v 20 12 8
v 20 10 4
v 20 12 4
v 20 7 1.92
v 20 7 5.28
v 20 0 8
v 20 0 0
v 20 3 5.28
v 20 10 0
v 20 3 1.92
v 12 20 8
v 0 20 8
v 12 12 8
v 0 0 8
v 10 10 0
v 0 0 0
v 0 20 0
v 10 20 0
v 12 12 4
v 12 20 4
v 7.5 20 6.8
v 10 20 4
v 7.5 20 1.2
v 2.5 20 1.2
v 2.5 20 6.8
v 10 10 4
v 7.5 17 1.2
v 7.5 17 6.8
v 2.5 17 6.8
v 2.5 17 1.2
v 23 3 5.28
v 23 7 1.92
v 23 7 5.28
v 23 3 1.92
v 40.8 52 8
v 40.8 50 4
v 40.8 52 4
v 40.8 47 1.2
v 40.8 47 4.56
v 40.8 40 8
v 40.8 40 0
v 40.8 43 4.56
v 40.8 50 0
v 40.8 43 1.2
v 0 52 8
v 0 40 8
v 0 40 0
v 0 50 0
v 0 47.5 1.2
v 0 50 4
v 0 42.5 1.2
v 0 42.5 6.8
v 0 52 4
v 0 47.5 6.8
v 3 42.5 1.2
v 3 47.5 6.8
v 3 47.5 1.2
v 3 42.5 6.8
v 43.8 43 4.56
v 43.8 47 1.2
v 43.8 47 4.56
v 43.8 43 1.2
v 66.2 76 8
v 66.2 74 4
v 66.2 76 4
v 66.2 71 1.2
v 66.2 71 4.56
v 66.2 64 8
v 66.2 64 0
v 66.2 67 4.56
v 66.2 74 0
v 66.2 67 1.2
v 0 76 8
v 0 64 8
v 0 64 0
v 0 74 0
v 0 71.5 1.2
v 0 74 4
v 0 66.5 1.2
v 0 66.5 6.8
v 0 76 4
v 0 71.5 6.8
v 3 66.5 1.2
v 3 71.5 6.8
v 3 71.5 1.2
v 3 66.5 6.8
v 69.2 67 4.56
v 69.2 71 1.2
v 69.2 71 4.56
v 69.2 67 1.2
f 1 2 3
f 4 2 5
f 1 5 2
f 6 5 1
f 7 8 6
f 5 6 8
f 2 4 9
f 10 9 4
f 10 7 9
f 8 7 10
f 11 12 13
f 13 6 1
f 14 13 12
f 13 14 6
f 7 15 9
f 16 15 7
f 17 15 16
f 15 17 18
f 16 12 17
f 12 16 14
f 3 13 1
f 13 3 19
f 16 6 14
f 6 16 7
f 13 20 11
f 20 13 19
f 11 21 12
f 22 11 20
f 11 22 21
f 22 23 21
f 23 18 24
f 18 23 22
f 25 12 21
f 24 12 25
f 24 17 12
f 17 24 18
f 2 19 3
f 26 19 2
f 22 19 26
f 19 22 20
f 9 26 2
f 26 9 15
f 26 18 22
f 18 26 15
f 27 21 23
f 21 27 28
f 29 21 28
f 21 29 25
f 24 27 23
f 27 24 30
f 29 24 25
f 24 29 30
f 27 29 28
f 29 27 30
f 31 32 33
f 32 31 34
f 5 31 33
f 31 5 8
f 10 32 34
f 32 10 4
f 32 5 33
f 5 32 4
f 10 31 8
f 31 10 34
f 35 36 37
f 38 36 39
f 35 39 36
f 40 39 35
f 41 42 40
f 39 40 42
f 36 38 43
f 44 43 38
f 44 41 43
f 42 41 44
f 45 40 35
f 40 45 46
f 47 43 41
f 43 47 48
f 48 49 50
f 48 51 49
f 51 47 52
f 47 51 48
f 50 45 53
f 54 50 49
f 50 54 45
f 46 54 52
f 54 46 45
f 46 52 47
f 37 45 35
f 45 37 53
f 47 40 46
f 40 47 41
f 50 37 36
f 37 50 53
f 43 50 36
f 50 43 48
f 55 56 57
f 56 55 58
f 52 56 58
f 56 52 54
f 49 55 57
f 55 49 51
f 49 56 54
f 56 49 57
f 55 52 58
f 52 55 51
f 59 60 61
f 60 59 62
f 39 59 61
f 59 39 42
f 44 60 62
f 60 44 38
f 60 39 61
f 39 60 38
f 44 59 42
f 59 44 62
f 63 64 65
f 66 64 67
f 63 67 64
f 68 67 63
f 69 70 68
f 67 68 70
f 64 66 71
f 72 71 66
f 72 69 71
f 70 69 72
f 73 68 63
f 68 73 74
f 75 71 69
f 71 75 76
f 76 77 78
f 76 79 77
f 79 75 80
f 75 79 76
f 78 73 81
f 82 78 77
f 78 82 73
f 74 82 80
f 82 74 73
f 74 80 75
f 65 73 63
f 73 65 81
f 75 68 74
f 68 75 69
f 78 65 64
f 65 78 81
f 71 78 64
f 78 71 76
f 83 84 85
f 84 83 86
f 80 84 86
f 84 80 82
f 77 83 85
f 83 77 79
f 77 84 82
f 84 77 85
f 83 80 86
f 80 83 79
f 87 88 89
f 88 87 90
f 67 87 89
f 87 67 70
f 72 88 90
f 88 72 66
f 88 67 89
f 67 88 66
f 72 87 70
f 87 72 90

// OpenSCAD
// file: frame_segment.scad
module frame_segment(segment_length, front_width, shelf_width, thickness, connector_length) {
    connector_offset = (front_width - shelf_width) * 0.5;
    //connector_radius = (thickness / 2) * 0.75;
    connector_width = (front_width - shelf_width) * 0.5;
    connector_height = thickness * 0.7;
    male_connector_width = connector_width * 0.8;
    male_connector_height = connector_height * 0.6;
    
    union () {
        difference() {
            cube([segment_length, front_width, thickness]);
            
            translate([0, front_width - shelf_width, 0])
            cube([segment_length, shelf_width, thickness / 2]);
            
            translate([0, (front_width - shelf_width - connector_width) / 2, (thickness-connector_height)/ 2])
            cube([connector_length, connector_width, connector_height]);
            //cylinder(connector_length, connector_radius, connector_radius);
        }
        
        translate([segment_length, (front_width - shelf_width - male_connector_width) / 2, (thickness-connector_height)/ 2])
        cube([connector_length, male_connector_width, male_connector_height]);
        //cylinder(connector_length, connector_width, connector_height);
    }
}

//frame_segment(21, 8, 1, 8, 3);
/*
PART_LENGTH = 100;
OUTER_WIDTH = 20;
INNER_WIDTH = 10;
FRAME_THICKNESS = 8;
CONNECTOR_DEPTH = 3;
CONNECTOR_RADIUS = (OUTER_WIDTH - INNER_WIDTH) * 0.5 * 0.75;
CONNECTOR_OFFSET = (OUTER_WIDTH - INNER_WIDTH) * 0.5;

union () {
    difference() {
        cube([PART_LENGTH, OUTER_WIDTH, FRAME_THICKNESS]);
        
        translate([0, OUTER_WIDTH / 2, 0])
        cube([PART_LENGTH, INNER_WIDTH, FRAME_THICKNESS / 2]);
        
        translate([CONNECTOR_DEPTH, CONNECTOR_OFFSET, FRAME_THICKNESS / 2])
        rotate([0, -90, 0])
        cylinder(CONNECTOR_DEPTH, CONNECTOR_RADIUS, CONNECTOR_RADIUS);
    }
    
    translate([PART_LENGTH, CONNECTOR_OFFSET, FRAME_THICKNESS / 2])
    rotate([0, 90, 0])
    cylinder(CONNECTOR_DEPTH, CONNECTOR_RADIUS, CONNECTOR_RADIUS);
}
*/
// file: frame_corner.scad
function calc_inner_edge(outer_edge_length, front_width) = outer_edge_length - front_width;

module frame_corner(outer_edge_length, front_width, shelf_width, thickness, connector_length) {
    inner_edge_length = outer_edge_length - front_width;
    connector_offset = (front_width - shelf_width) * 0.5;
    //connector_radius = (thickness / 2) * 0.75;
    connector_width = (front_width - shelf_width) * 0.5;
    connector_height = thickness * 0.7;
    male_connector_width = connector_width * 0.8;
    male_connector_height = connector_height * 0.6;
    
    union () {
    // Carve shelf for picture corner, carve connector hole
        difference () {
            // Form corner
            union(){
                cube([outer_edge_length, front_width, thickness]);

                translate([front_width, 0, 0])
                    rotate([0, 0, 90])
                        cube([outer_edge_length, front_width, thickness]);
            };
            // First shelf part
            translate([outer_edge_length - inner_edge_length, front_width - shelf_width, 0])
            cube([inner_edge_length, shelf_width, thickness / 2]);
            
            // Second shelf part
            translate([front_width - shelf_width, outer_edge_length - inner_edge_length, 0])
            cube([shelf_width, inner_edge_length, thickness / 2]);       
     
            
            // Corner between shelves
            translate([front_width - shelf_width, front_width - shelf_width, 0])
            cube([shelf_width, shelf_width, thickness / 2]);
            
            // Connector recess
            translate([(front_width - shelf_width - connector_width) / 2, outer_edge_length - connector_length, (thickness-connector_height)/ 2])
            cube([connector_width, connector_length, connector_height]);
            //cylinder(connector_length, connector_radius, connector_radius);
        }
        
        // Connector peg
        translate([outer_edge_length,(front_width - shelf_width - male_connector_width) / 2, (thickness-connector_height) * 0.8])
        cube([connector_length, male_connector_width, male_connector_height]);
        //cylinder(connector_length, connector_radius*.8, connector_radius*.8);
    }
}

//frame_corner(40, 20, 10, 8, 3);

/*LEN_WID = 40; // Length of each outer edge
OUTER_WIDTH = 20; // Width of ends
INNER_WIDTH = 10; // Widtb of shelf ends
FRAME_THICKNESS = 8;
INNER_LEN_WID = LEN_WID - OUTER_WIDTH; // Length of each inside edge
CONNECTOR_DEPTH = 3;
CONNECTOR_RADIUS = (OUTER_WIDTH - INNER_WIDTH) * 0.5 * 0.75;
CONNECTOR_OFFSET = (OUTER_WIDTH - INNER_WIDTH) * 0.5;

// Add connector peg
union () {
    // Carve shelf for picture corner, carve connector hole
    difference () {
        // Form corner
        union(){
            cube([LEN_WID, OUTER_WIDTH, FRAME_THICKNESS]);

            translate([OUTER_WIDTH, 0, 0])
                rotate([0, 0, 90])
                    cube([LEN_WID, OUTER_WIDTH, FRAME_THICKNESS]);
        };
        // First shelf part
        translate([LEN_WID / 2, OUTER_WIDTH / 2, 0])
        cube([INNER_LEN_WID, INNER_WIDTH, FRAME_THICKNESS / 2]);
        
        // Second shelf part
        translate([OUTER_WIDTH, LEN_WID / 2, 0])
        rotate([0, 0, 90])
        cube([INNER_LEN_WID, INNER_WIDTH, FRAME_THICKNESS / 2]);
        
        // Corner between shelves
        translate([OUTER_WIDTH / 2, OUTER_WIDTH / 2, 0])
        cube([INNER_WIDTH, INNER_WIDTH, FRAME_THICKNESS / 2]);
        
        // Connector recess
        translate([CONNECTOR_OFFSET, LEN_WID - CONNECTOR_DEPTH, FRAME_THICKNESS / 2])
        rotate([-90, 0, 0])
        cylinder(CONNECTOR_DEPTH, CONNECTOR_RADIUS, CONNECTOR_RADIUS);
    }
    
    // Connector peg
    translate([LEN_WID + CONNECTOR_DEPTH, CONNECTOR_OFFSET, FRAME_THICKNESS / 2])
        rotate([0, -90, 0])
        cylinder(CONNECTOR_DEPTH, CONNECTOR_RADIUS, CONNECTOR_RADIUS);
}
*/
// main file
use <frame_corner.scad>
use <frame_segment.scad>

// FRAME_LENGTH = 158.4;
// FRAME_WIDTH = 107.6;
FRAME_LENGTH = 172.4;
FRAME_WIDTH = 121.6;

N_LEN_PARTS = 2;
N_WID_PARTS = 2;

CORNER_LENGTH = 20;
FACE_WIDTH = 12;
INNER_MARGIN_WIDTH = 2;
THICKNESS = 8;
CONNECTOR_LENGTH = 3;

function segment_distance(dimension_length, corner_length) = dimension_length - (corner_length * 2);

inner_corner_length = calc_inner_edge(CORNER_LENGTH, FACE_WIDTH);
max_picture_width = (INNER_MARGIN_WIDTH * 2) + segment_distance(FRAME_WIDTH, CORNER_LENGTH) + (inner_corner_length * 2);
max_picture_length = (INNER_MARGIN_WIDTH * 2) + segment_distance(FRAME_LENGTH, CORNER_LENGTH) + (inner_corner_length * 2);
echo(str("Width segment length: ", segment_distance(FRAME_WIDTH, CORNER_LENGTH) / N_WID_PARTS, " mm"));
echo(str("Length segment length: ", segment_distance(FRAME_LENGTH, CORNER_LENGTH) / N_LEN_PARTS, " mm"));
echo(str("Actual supported picture dimensions are: ", max_picture_length, " mm x ", max_picture_width, " mm"));

module generate_frame(frame_length, 
                      frame_width, 
                      n_length_segments = 2, 
                      n_width_segments = 1, 
                      corner_length = 15, 
                      face_width = 8, 
                      inner_margin_width = 1, 
                      thickness = 8, 
                      connector_length = 3) {
                          corner_inner_edge_length = calc_inner_edge(corner_length, face_width);
                          
                          // Calc actual distance to be covered by straight segments
                          // width_distance = frame_width - (corner_length * 2) + connector_length;
                          // length_distance = frame_length - (corner_length * 2) + connector_length ;
                          
                          // Calc size of segments to cover distance given n_segments
                          width_seg_size = segment_distance(frame_width, corner_length) / n_width_segments;
                          length_seg_size = segment_distance(frame_length, corner_length) / n_length_segments;
                          
                          //echo("width seg size: ", width_seg_size);
                          //echo("length seg size: ", length_seg_size);
                          // Gen corners
                          frame_corner(corner_length, face_width, inner_margin_width, thickness, connector_length);
                          
                          translate([connector_length*(1+n_width_segments), 0, 0])//DEBUG
                          translate([frame_width+connector_length, 0, 0])
                          rotate([0, 0, 90])
                          frame_corner(corner_length, face_width, inner_margin_width, thickness, connector_length);
                          
                          translate([connector_length*(1+n_width_segments), connector_length*(1+n_length_segments), 0])//DEBUG
                          translate([frame_width+connector_length, frame_length+connector_length, 0])
                          rotate([0, 0, 180])
                          frame_corner(corner_length, face_width, inner_margin_width, thickness, connector_length);
                          
                          translate([0, connector_length*(1+n_length_segments), 0])//DEBUG
                          translate([0, frame_length+connector_length, 0])
                          rotate([0, 0, 270])
                          frame_corner(corner_length, face_width, inner_margin_width, thickness, connector_length);
                          
                          
                          // Gen width segments
                          for (i = [1:n_width_segments]) {
                              x_offset = corner_length + ((i-1) * width_seg_size);
                              y_offset = 0;
                              
                              translate([i*connector_length, 0, 0])//DEBUG
                              translate([x_offset, y_offset, 0])
                              frame_segment(segment_length = width_seg_size,
                              front_width = face_width,
                              shelf_width = inner_margin_width,
                              thickness = thickness,
                              connector_length = connector_length);
                          }
                          
                          for (i = [1:n_width_segments]) {
                              x_offset = (frame_width - corner_length + connector_length) - ((i-1) * width_seg_size);
                              y_offset = frame_length + connector_length;
                              
                              translate([connector_length*((n_length_segments+1)-i), connector_length * (1+n_length_segments), 0])//DEBUG
                              translate([x_offset, y_offset, 0])
                              // Rotate can be thought of as pivoting by SW corner
                              // therefore offset to put flush with N face of corner
                              rotate([0, 0, 180])
                              frame_segment(segment_length = width_seg_size,
                              front_width = face_width,
                              shelf_width = inner_margin_width,
                              thickness = thickness,
                              connector_length = connector_length);
                          }
                          
                          // Gen length segments
                          for (i = [1:n_length_segments]) {
                              x_offset = frame_width + connector_length;
                              y_offset = corner_length + ((i-1) * length_seg_size);
                              
                              translate([connector_length * (1 + n_width_segments), connector_length * i, 0])//DEBUG
                              translate([x_offset, y_offset, 0])
                              rotate([0, 0, 90])
                              frame_segment(segment_length = length_seg_size,
                              front_width = face_width, 
                              shelf_width = inner_margin_width, 
                              thickness = thickness, 
                              connector_length = connector_length);
                          }
                          
                          for (i = [1:n_length_segments]) {
                              x_offset = 0;
                              y_offset = (frame_length - corner_length + connector_length) - ((i-1) *length_seg_size);
                              
                              translate([0, connector_length*((n_length_segments+1)-i), 0])//DEBUG
                              translate([x_offset, y_offset, 0])
                              rotate([0, 0, 270])
                              frame_segment(segment_length = length_seg_size,
                              front_width = face_width, 
                              shelf_width = inner_margin_width, 
                              thickness = thickness, 
                              connector_length = connector_length);
                          }
                      }
                      
module generate_individual_frame_parts(
                      frame_length, 
                      frame_width, 
                      n_length_segments = 2, 
                      n_width_segments = 1, 
                      corner_length = 15, 
                      face_width = 8, 
                      inner_margin_width = 1, 
                      thickness = 8, 
                      connector_length = 3
                      ) {
                          corner_inner_edge_length = calc_inner_edge(corner_length, face_width);
                          
                          // Calc actual distance to be covered by straight segments
                          //width_distance = frame_width - (corner_length * 2);
                          // length_distance = frame_length - (corner_length * 2);
                          
                          // Calc size of segments to cover distance given n_segments
                          width_seg_size = segment_distance(frame_width, corner_length) / n_width_segments;
                          length_seg_size = segment_distance(frame_length, corner_length) / n_length_segments;
                          
                          echo("width seg size: ", width_seg_size);
                          echo("length seg size: ", length_seg_size);
                          // Gen corner
                          frame_corner(corner_length, face_width, inner_margin_width, thickness, connector_length);
                          
                          // Gen width piece
                          translate([0, corner_length*2, 0])
                          frame_segment(segment_length = width_seg_size,
                              front_width = face_width,
                              shelf_width = inner_margin_width,
                              thickness = thickness,
                              connector_length = connector_length);
                              
                          // Gen length piece
                          translate([0, (corner_length*2)+(face_width * 2), 0])
                          frame_segment(segment_length = length_seg_size,
                              front_width = face_width, 
                              shelf_width = inner_margin_width, 
                              thickness = thickness, 
                              connector_length = connector_length);
                          
}

generate_individual_frame_parts(frame_length = FRAME_LENGTH, frame_width = FRAME_WIDTH,
                      n_length_segments = N_LEN_PARTS,
                      n_width_segments = N_WID_PARTS,
                      corner_length = CORNER_LENGTH,
                      face_width = FACE_WIDTH,
                      inner_margin_width = INNER_MARGIN_WIDTH,
                      thickness = THICKNESS,
                      connector_length = CONNECTOR_LENGTH);

/*                  
generate_frame(frame_length = FRAME_LENGTH, frame_width = FRAME_WIDTH,
                      n_length_segments = N_LEN_PARTS,
                      n_width_segments = N_WID_PARTS,
                      corner_length = 15,
                      face_width = 6,
                      inner_margin_width = 2,
                      thickness = 4,
                      connector_length = 3);
*/
                      
